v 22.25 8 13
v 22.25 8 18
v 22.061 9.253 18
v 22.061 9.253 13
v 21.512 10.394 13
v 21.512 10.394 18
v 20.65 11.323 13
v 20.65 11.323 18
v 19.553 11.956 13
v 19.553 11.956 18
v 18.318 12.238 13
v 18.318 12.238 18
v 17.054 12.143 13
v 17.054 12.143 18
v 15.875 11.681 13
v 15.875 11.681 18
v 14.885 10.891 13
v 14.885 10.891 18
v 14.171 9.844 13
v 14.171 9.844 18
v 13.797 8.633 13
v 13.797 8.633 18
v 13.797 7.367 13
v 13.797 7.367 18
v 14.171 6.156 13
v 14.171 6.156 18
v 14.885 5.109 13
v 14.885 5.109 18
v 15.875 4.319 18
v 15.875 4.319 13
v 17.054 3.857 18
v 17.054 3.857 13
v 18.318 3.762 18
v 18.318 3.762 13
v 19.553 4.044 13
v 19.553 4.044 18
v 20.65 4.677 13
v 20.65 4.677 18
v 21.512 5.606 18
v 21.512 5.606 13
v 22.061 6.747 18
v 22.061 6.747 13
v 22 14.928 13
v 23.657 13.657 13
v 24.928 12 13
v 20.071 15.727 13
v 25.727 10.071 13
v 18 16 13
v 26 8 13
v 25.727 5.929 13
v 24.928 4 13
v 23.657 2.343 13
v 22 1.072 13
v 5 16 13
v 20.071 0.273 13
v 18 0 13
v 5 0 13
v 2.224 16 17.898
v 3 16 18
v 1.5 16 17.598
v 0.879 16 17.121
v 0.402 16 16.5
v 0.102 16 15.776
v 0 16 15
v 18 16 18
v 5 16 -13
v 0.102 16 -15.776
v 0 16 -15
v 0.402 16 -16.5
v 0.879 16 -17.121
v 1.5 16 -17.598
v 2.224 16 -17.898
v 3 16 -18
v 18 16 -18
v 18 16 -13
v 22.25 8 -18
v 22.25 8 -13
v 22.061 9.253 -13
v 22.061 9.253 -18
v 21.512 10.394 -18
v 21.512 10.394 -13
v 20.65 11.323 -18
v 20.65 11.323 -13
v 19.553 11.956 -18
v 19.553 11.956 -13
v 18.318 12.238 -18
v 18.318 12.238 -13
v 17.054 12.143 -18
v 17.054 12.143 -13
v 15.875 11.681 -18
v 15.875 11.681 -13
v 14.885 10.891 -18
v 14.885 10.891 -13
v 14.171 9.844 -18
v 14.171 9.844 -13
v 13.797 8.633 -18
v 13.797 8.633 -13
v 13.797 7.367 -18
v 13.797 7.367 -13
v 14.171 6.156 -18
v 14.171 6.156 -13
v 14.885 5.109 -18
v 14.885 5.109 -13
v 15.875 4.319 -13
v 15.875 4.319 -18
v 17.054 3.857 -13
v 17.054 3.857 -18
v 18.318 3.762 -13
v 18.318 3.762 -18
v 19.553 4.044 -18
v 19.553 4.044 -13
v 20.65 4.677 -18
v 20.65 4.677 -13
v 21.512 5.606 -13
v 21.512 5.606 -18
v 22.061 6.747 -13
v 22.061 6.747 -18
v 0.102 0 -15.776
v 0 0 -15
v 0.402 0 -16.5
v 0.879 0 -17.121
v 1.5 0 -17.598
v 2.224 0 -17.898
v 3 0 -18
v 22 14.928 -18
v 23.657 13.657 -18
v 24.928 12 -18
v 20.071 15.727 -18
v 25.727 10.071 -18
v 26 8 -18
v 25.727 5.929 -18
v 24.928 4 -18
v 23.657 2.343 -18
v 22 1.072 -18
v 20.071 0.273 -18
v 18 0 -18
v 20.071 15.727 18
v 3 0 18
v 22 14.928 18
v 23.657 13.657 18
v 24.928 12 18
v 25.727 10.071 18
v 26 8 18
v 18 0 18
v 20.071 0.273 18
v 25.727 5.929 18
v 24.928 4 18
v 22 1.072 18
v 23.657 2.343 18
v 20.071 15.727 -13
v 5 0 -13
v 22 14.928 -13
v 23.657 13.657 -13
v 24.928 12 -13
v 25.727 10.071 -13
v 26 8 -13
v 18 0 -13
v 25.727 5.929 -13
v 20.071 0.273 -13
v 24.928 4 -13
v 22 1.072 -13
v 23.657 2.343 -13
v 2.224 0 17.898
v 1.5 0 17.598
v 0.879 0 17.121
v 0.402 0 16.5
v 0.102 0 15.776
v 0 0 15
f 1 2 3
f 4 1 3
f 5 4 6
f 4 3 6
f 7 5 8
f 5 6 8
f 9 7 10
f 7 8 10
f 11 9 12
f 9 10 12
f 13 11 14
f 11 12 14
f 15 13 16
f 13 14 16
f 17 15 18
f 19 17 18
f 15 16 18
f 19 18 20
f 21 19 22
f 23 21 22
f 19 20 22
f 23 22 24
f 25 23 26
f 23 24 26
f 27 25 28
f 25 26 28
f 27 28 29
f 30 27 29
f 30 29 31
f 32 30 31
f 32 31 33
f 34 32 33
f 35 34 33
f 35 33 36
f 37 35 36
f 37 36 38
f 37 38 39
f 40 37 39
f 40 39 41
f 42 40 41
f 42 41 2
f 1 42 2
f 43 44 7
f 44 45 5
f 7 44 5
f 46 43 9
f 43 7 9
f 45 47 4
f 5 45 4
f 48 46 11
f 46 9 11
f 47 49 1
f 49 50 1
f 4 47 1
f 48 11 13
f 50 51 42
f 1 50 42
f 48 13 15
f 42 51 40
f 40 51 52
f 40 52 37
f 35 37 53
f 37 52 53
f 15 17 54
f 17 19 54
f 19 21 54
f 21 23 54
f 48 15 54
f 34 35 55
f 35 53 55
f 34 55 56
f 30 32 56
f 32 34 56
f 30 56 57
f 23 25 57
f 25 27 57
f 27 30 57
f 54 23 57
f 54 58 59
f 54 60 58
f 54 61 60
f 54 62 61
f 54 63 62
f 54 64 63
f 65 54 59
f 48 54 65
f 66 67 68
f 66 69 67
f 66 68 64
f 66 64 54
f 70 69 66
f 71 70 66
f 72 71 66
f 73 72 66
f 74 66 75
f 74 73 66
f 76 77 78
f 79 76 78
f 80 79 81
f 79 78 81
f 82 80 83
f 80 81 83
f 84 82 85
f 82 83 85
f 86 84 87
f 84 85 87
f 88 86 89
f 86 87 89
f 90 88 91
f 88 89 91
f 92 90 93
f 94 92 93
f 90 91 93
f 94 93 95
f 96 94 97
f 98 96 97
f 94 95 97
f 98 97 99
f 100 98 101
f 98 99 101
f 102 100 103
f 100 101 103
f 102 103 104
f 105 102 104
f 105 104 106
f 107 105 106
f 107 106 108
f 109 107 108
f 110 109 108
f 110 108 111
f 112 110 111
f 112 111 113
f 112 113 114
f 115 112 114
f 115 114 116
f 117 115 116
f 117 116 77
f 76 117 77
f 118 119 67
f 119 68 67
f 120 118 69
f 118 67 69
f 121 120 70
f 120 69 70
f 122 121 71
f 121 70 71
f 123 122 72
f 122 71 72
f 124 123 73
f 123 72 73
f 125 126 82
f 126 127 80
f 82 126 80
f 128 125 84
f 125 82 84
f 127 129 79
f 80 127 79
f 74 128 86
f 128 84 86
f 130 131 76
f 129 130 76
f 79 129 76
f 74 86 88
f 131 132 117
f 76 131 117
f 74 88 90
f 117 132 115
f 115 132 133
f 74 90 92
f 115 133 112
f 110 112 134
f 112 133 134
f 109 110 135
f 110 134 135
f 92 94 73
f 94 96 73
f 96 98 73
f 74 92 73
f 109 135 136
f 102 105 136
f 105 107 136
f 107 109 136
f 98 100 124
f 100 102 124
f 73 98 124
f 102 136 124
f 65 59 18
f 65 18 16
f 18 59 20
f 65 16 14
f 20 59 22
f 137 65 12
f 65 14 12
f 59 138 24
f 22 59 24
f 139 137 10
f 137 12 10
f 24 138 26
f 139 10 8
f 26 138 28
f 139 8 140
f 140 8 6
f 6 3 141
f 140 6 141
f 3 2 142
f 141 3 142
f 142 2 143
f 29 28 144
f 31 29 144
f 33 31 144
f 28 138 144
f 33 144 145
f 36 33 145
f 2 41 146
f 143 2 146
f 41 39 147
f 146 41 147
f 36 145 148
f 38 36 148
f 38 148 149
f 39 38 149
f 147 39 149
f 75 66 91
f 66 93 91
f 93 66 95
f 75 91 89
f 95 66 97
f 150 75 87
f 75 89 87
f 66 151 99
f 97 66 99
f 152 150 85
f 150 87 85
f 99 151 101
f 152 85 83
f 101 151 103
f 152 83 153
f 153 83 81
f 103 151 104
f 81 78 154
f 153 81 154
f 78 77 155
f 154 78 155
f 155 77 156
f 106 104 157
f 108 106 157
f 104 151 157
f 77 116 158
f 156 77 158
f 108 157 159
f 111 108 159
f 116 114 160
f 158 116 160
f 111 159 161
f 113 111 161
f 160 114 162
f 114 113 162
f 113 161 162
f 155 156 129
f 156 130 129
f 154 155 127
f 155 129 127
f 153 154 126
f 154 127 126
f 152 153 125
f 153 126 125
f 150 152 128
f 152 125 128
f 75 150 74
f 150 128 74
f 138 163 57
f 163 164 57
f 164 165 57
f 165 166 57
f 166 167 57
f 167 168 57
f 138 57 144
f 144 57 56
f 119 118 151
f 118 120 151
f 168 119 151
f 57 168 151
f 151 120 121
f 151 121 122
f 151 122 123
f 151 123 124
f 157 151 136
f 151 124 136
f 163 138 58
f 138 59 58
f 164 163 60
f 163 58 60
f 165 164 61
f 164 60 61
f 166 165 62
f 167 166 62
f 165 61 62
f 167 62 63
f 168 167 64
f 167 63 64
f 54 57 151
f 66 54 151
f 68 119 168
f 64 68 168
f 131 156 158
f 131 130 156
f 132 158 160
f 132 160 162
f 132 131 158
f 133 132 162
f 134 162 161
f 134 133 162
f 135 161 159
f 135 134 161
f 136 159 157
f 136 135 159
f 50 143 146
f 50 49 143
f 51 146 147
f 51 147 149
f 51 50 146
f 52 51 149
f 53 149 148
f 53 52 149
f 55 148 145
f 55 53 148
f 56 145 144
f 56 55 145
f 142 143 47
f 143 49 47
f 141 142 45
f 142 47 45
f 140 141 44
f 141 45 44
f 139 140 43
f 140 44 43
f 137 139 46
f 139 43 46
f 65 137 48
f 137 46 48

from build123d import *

# Parameters (mm, degrees)
EXTRUDE_1_DEPTH     = 16
FILLET_1_R          = 8
FILLET_2_R          = 3
SKETCH_2_R          = 4.25
CUT_EXTRUDE_1_DEPTH = 48.201694885


with BuildPart() as part:
    # Эскиз1 → Бобышка-Вытянуть1 (new body)
    with BuildSketch(Plane(origin=(0, 0, 0), x_dir=(1, 0, 0), z_dir=(0, 1, 0))):
        Polygon((0, 18), (0, -18), (26, -18), (26, -13), (5, -13), (5, 13), (26, 13), (26, 18), align=None)
    extrude(amount=EXTRUDE_1_DEPTH)

    # Скругление1
    fillet_1_edges = [part.edges().sort_by_distance(p)[0] for p in [
        (26, 0, -15.5),
        (26, 16, -15.5),
        (26, 0, 15.5),
        (26, 16, 15.5),
    ]]
    fillet(fillet_1_edges, radius=FILLET_1_R - 0.0001)  # a hair under: the kernel refuses the full size

    # Скругление2
    fillet_2_edges = [part.edges().sort_by_distance(p)[0] for p in [
        (0, 8, 18),
        (0, 8, -18),
    ]]
    fillet(fillet_2_edges, radius=FILLET_2_R)

    # Эскиз2 → Вырез-Вытянуть1 (cut, through all)
    with BuildSketch(Plane.XY.offset(18)):
        with Locations((18, 8)):
            Circle(SKETCH_2_R)
    extrude(amount=-CUT_EXTRUDE_1_DEPTH, mode=Mode.SUBTRACT)


solid = part.part
